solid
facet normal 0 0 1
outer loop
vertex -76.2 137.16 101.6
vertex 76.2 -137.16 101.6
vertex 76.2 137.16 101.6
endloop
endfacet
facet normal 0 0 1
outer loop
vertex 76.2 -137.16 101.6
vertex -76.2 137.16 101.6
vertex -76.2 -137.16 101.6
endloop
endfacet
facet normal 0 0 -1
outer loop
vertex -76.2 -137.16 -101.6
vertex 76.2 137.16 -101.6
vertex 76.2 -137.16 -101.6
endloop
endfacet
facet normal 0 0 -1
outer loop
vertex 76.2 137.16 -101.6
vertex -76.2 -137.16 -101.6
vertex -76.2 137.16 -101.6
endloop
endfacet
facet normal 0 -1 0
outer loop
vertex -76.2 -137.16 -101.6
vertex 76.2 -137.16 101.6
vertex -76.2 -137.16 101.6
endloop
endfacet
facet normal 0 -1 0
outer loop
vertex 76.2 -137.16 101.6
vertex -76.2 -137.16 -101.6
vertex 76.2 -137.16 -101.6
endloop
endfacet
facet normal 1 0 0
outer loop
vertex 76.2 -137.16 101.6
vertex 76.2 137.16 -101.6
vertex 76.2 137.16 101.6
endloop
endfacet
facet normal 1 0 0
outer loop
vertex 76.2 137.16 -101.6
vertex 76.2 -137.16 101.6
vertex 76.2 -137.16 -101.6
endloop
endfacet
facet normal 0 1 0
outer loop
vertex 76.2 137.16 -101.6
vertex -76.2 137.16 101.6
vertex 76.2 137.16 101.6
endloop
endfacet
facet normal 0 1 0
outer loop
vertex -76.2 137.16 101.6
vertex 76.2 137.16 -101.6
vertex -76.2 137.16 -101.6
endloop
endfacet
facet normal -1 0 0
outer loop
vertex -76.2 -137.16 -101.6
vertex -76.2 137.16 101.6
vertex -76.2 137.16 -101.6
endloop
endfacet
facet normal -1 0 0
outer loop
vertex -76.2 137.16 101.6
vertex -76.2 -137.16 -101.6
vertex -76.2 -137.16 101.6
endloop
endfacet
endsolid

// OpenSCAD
// file: src/utils/math.scad
// =============================================================================
// Mathematical Utility Functions
// =============================================================================

// Constants
PI = 3.14159265359;
EPSILON = 0.0001;

// =============================================================================
// TRIGONOMETRIC HELPERS
// =============================================================================

// Convert degrees to radians
function deg_to_rad(degrees) = degrees * PI / 180;

// Convert radians to degrees  
function rad_to_deg(radians) = radians * 180 / PI;

// Normalize angle to 0-360 degrees
function normalize_angle(angle) = 
    angle < 0 ? normalize_angle(angle + 360) :
    angle >= 360 ? normalize_angle(angle - 360) :
    angle;

// =============================================================================
// VECTOR OPERATIONS
// =============================================================================

// Vector magnitude/length
function vector_length(v) = sqrt(v[0]*v[0] + v[1]*v[1] + v[2]*v[2]);

// 2D vector magnitude
function vector_length_2d(v) = sqrt(v[0]*v[0] + v[1]*v[1]);

// Normalize vector to unit length
function normalize_vector(v) = 
    let(len = vector_length(v))
    len > EPSILON ? v / len : [0, 0, 0];

// 2D vector normalization
function normalize_vector_2d(v) = 
    let(len = vector_length_2d(v))
    len > EPSILON ? v / len : [0, 0];

// Dot product
function dot_product(v1, v2) = v1[0]*v2[0] + v1[1]*v2[1] + v1[2]*v2[2];

// 2D dot product
function dot_product_2d(v1, v2) = v1[0]*v2[0] + v1[1]*v2[1];

// Cross product (3D)
function cross_product(v1, v2) = [
    v1[1]*v2[2] - v1[2]*v2[1],
    v1[2]*v2[0] - v1[0]*v2[2], 
    v1[0]*v2[1] - v1[1]*v2[0]
];

// 2D cross product (returns scalar)
function cross_product_2d(v1, v2) = v1[0]*v2[1] - v1[1]*v2[0];

// Distance between two points
function distance(p1, p2) = vector_length(p2 - p1);

// 2D distance between two points
function distance_2d(p1, p2) = vector_length_2d(p2 - p1);

// =============================================================================
// INTERPOLATION FUNCTIONS
// =============================================================================

// Linear interpolation between two values
function lerp(a, b, t) = a + t * (b - a);

// Linear interpolation between two points
function lerp_point(p1, p2, t) = [
    lerp(p1[0], p2[0], t),
    lerp(p1[1], p2[1], t),
    len(p1) > 2 ? lerp(p1[2], p2[2], t) : 0
];

// Smoothstep interpolation (smooth start/end)
function smoothstep(t) = t * t * (3 - 2 * t);

// Smootherstep interpolation (smoother start/end)
function smootherstep(t) = t * t * t * (t * (t * 6 - 15) + 10);

// Clamp value between min and max
function clamp(value, min_val, max_val) = 
    min(max(value, min_val), max_val);

// Map value from one range to another
function map_range(value, from_min, from_max, to_min, to_max) =
    lerp(to_min, to_max, (value - from_min) / (from_max - from_min));

// =============================================================================
// UTILITY FUNCTIONS
// =============================================================================

// Sign function (-1, 0, or 1)
function sign(x) = x > 0 ? 1 : x < 0 ? -1 : 0;

// Check if value is approximately equal (within epsilon)
function approx_equal(a, b, epsilon = EPSILON) = abs(a - b) < epsilon;

// Round to nearest increment
function round_to_increment(value, increment) = 
    round(value / increment) * increment;

// Modulo that works with negative numbers
function mod(a, n) = a - n * floor(a / n);

// =============================================================================
// RANGE AND SEQUENCE FUNCTIONS
// =============================================================================

// Generate range of numbers
function range(start, end, step = 1) = 
    step > 0 && start <= end ? [for (i = [start : step : end]) i] :
    step < 0 && start >= end ? [for (i = [start : step : end]) i] :
    [];

// Generate linearly spaced numbers
function linspace(start, end, num) = 
    num <= 1 ? [start] :
    [for (i = [0 : num-1]) lerp(start, end, i / (num-1))];

// =============================================================================
// BOOLEAN AND COMPARISON HELPERS
// =============================================================================

// Check if point is inside 2D bounding box
function point_in_bbox_2d(point, bbox_min, bbox_max) =
    point[0] >= bbox_min[0] && point[0] <= bbox_max[0] &&
    point[1] >= bbox_min[1] && point[1] <= bbox_max[1];

// Check if point is inside 3D bounding box
function point_in_bbox_3d(point, bbox_min, bbox_max) =
    point[0] >= bbox_min[0] && point[0] <= bbox_max[0] &&
    point[1] >= bbox_min[1] && point[1] <= bbox_max[1] &&
    point[2] >= bbox_min[2] && point[2] <= bbox_max[2];

// =============================================================================
// EXAMPLES AND TESTS
// =============================================================================

// Uncomment to test functions
// echo("Vector length [3,4,5]:", vector_length([3, 4, 5])); // Should be ~7.07
// echo("Normalize [3,4,0]:", normalize_vector([3, 4, 0])); // Should be [0.6, 0.8, 0]
// echo("Lerp 0 to 10 at 0.5:", lerp(0, 10, 0.5)); // Should be 5
// echo("Range 0 to 10 step 2:", range(0, 10, 2)); // Should be [0,2,4,6,8,10]
// file: src/config/tolerances.scad
// =============================================================================
// Teardrop Camper Tolerances & Manufacturing Settings
// =============================================================================

// =============================================================================
// MANUFACTURING CLEARANCES
// =============================================================================

// Basic clearance values
clearance_tight = 0.25;      // 0.01" - Very tight fit for precision parts
clearance_normal = 0.5;      // 0.02" - Standard clearance for most parts
clearance_loose = 1.0;       // 0.04" - Loose fit for moving parts
clearance_slide = 1.5;       // 0.06" - Sliding parts clearance

// Specific component clearances
door_perimeter_gap = 3.0;     // 1/8" - Door perimeter gap 
window_perimeter_gap = 3.0;   // 1/8" - Window perimeter gap
panel_edge_gap = 1.0;         // 0.04" - Gap between adjacent panels
floor_wall_gap = 0.5;         // 0.02" - Gap between floor and wall panels

// Hardware installation clearances
bolt_hole_clearance = 1.0;    // 0.04" - Standard bolt hole clearance
screw_pilot_reduction = 0.5;  // 0.02" - Pilot hole reduction from screw diameter
hinge_placement_tolerance = 1.0; // 0.04" - Hinge placement tolerance

// Thermal expansion allowances
aluminum_expansion_gap = 2.0;   // Gap to allow for aluminum thermal expansion
wood_expansion_gap = 3.0;       // Gap to allow for wood moisture expansion

// =============================================================================
// FIT CLASSES
// =============================================================================

// ISO fit classes for mechanical components (mm)
// Naming: fit_[part]_[fit_type]

// Sliding fits
fit_slide_loose = 0.75;      // Loose sliding fit
fit_slide_normal = 0.5;      // Normal sliding fit
fit_slide_precise = 0.3;     // Precision sliding fit

// Press fits
fit_press_light = 0.1;       // Light press fit
fit_press_medium = 0.2;      // Medium press fit
fit_press_heavy = 0.3;       // Heavy press fit

// Clearance fits
fit_clear_close = 0.2;       // Close clearance fit
fit_clear_normal = 0.5;      // Normal clearance fit
fit_clear_loose = 1.0;       // Loose clearance fit

// =============================================================================
// POSITION TOLERANCES
// =============================================================================

// Positional tolerances for construction
position_precise = 0.5;      // 0.02" - Precise positioning tolerance
position_standard = 1.0;     // 0.04" - Standard positioning tolerance
position_rough = 2.5;        // 0.10" - Rough positioning tolerance

// Alignment tolerances
alignment_critical = 0.25;   // Critical alignment (hinges, latches)
alignment_standard = 1.0;    // Standard alignment (most components)
alignment_rough = 2.5;       // Rough alignment (non-critical components)

// =============================================================================
// THREAD SPECIFICATIONS
// =============================================================================

// Common thread specifications
thread_m3_tap_drill = 2.5;   // M3 tap drill diameter
thread_m4_tap_drill = 3.3;   // M4 tap drill diameter
thread_m5_tap_drill = 4.2;   // M5 tap drill diameter
thread_m6_tap_drill = 5.0;   // M6 tap drill diameter
thread_m8_tap_drill = 6.8;   // M8 tap drill diameter

// Thread engagement lengths (rule of thumb: 1-2× diameter)
thread_engagement_minimum = 0.8;  // Minimum thread engagement factor
thread_engagement_standard = 1.5; // Standard thread engagement factor
thread_engagement_maximum = 2.0;  // Maximum thread engagement factor

// =============================================================================
// TOLERANCE FUNCTIONS
// =============================================================================

// Function to apply specified clearance to dimension
function apply_clearance(dimension, clearance_type = "normal") =
    clearance_type == "tight" ? dimension + clearance_tight :
    clearance_type == "normal" ? dimension + clearance_normal :
    clearance_type == "loose" ? dimension + clearance_loose :
    clearance_type == "slide" ? dimension + clearance_slide :
    dimension + clearance_normal;  // Default to normal

// Function to apply fit tolerance to a shaft/hole dimension
function apply_fit(base_dimension, part_type, fit_type) =
    // For holes, add clearance
    part_type == "hole" ? (
        fit_type == "slide_loose" ? base_dimension + fit_slide_loose :
        fit_type == "slide_normal" ? base_dimension + fit_slide_normal :
        fit_type == "slide_precise" ? base_dimension + fit_slide_precise :
        fit_type == "clear_close" ? base_dimension + fit_clear_close :
        fit_type == "clear_normal" ? base_dimension + fit_clear_normal :
        fit_type == "clear_loose" ? base_dimension + fit_clear_loose :
        fit_type == "press_light" ? base_dimension - fit_press_light :
        fit_type == "press_medium" ? base_dimension - fit_press_medium :
        fit_type == "press_heavy" ? base_dimension - fit_press_heavy :
        base_dimension + fit_clear_normal  // Default to normal clearance
    ) :
    // For shafts, subtract clearance
    part_type == "shaft" ? (
        fit_type == "slide_loose" ? base_dimension - fit_slide_loose :
        fit_type == "slide_normal" ? base_dimension - fit_slide_normal :
        fit_type == "slide_precise" ? base_dimension - fit_slide_precise :
        fit_type == "clear_close" ? base_dimension - fit_clear_close :
        fit_type == "clear_normal" ? base_dimension - fit_clear_normal :
        fit_type == "clear_loose" ? base_dimension - fit_clear_loose :
        fit_type == "press_light" ? base_dimension + fit_press_light :
        fit_type == "press_medium" ? base_dimension + fit_press_medium :
        fit_type == "press_heavy" ? base_dimension + fit_press_heavy :
        base_dimension - fit_clear_normal  // Default to normal clearance
    ) :
    // Default return base dimension if part_type is unspecified
    base_dimension;

// Function to calculate correct pilot hole size for a screw
function pilot_hole_size(screw_diameter, material) =
    material == "softwood" ? screw_diameter * 0.7 :
    material == "hardwood" ? screw_diameter * 0.8 :
    material == "plywood" ? screw_diameter * 0.75 :
    material == "metal" ? screw_diameter * 0.9 :
    material == "plastic" ? screw_diameter * 0.85 :
    screw_diameter * 0.75;  // Default to plywood

// Function to calculate correct thread engagement depth
function thread_engagement(screw_diameter, material) =
    material == "aluminum" ? screw_diameter * thread_engagement_standard :
    material == "steel" ? screw_diameter * thread_engagement_minimum :
    material == "plastic" ? screw_diameter * thread_engagement_maximum :
    material == "wood" ? screw_diameter * 2.0 :
    screw_diameter * thread_engagement_standard;  // Default

// =============================================================================
// HELPER MODULES
// =============================================================================

// Module to create a clearance hole for a bolt
module clearance_hole(diameter, depth = 20, clearance_type = "normal") {
    adjusted_diameter = apply_clearance(diameter, clearance_type);
    cylinder(h = depth, d = adjusted_diameter);
}

// Module to create a countersunk hole
module countersunk_hole(diameter, head_diameter, depth = 20, head_depth = 3, clearance_type = "normal") {
    adjusted_diameter = apply_clearance(diameter, clearance_type);
    adjusted_head = apply_clearance(head_diameter, clearance_type);
    
    union() {
        cylinder(h = depth, d = adjusted_diameter);
        cylinder(h = head_depth, d1 = adjusted_diameter, d2 = adjusted_head);
    }
}

// Module to add a tolerance gap between parts
module tolerance_gap(width, length, depth, gap_size = clearance_normal) {
    cube([width + gap_size*2, length + gap_size*2, depth]);
}
// file: src/config/materials.scad
// =============================================================================
// Teardrop Camper Materials & Visual Properties
// =============================================================================

// =============================================================================
// COLOR DEFINITIONS
// =============================================================================

// Basic material colors
color_aluminum = [0.9, 0.9, 0.92, 1.0];        // Aluminum exterior
color_aluminum_dark = [0.8, 0.8, 0.83, 1.0];   // Darker aluminum accents
color_steel = [0.7, 0.7, 0.7, 1.0];            // Steel frame components
color_galvanized = [0.8, 0.82, 0.85, 1.0];     // Galvanized steel components
color_wood_deck = [0.8, 0.7, 0.5, 1.0];        // Wood trailer deck
color_rubber = [0.2, 0.2, 0.2, 1.0];           // Rubber components (tires, seals)
color_plastic_black = [0.2, 0.2, 0.22, 1.0];   // Black plastic components
color_plastic_white = [0.98, 0.98, 0.98, 1.0]; // White plastic components

// Interior colors
color_frp_white = [0.98, 0.98, 0.97, 1.0];     // Fiberglass reinforced panels
color_wood_ceiling = [0.82, 0.7, 0.55, 1.0];   // Wood-look ceiling panels
color_mattress = [0.7, 0.75, 0.8, 1.0];        // Mattress color
color_upholstery = [0.6, 0.65, 0.7, 1.0];      // Upholstery fabric

// Window & transparent materials
color_glass = [0.9, 0.95, 1.0, 0.5];           // Glass with transparency
color_glass_tinted = [0.7, 0.7, 0.8, 0.5];     // Tinted glass
color_plexiglass = [0.9, 0.95, 1.0, 0.7];      // Plexiglass/acrylic

// Insulation & invisible materials
color_insulation = [0.9, 0.85, 0.6, 0.7];      // Insulation material
color_frame = [0.7, 0.8, 0.8, 0.8];            // Framing (semi-transparent for visualization)

// Hardware colors
color_hinge_steel = [0.8, 0.8, 0.8, 1.0];      // Steel hinges
color_latch_chrome = [0.9, 0.9, 0.9, 1.0];     // Chrome latches
color_handle_aluminum = [0.95, 0.95, 0.95, 1.0]; // Aluminum handles
color_wire_black = [0.1, 0.1, 0.1, 1.0];       // Black electrical wiring
color_wire_red = [0.8, 0.2, 0.2, 1.0];         // Red electrical wiring

// =============================================================================
// MATERIAL PROPERTIES
// =============================================================================

// Structural materials
aluminum_thickness = 1.27;         // 0.050" aluminum sheet
frp_thickness = 2.38;              // 3/32" FRP panels
plywood_thickness = 12.7;          // 1/2" plywood
plywood_floor_thickness = 19.05;   // 3/4" floor plywood
insulation_thickness = 38.1;       // 1.5" foam insulation
frame_aluminum_size = 25.4;        // 1" aluminum angle/tube
frame_steel_size = 38.1;           // 1.5" steel tube/angle

// Hardware dimensions
hinge_length = 76.2;               // 3" hinge
hinge_width = 50.8;                // 2" hinge width
hinge_thickness = 3.175;           // 1/8" hinge material
screw_size_small = 4.0;            // #8 screws
screw_size_large = 6.35;           // 1/4" bolts

// =============================================================================
// RENDERING QUALITY PARAMETERS
// =============================================================================

// Define different quality levels for rendering
function get_fn(quality) =
    quality == "preview" ? 20 :     // Fast preview quality
    quality == "medium" ? 50 :      // Medium quality for development
    quality == "high" ? 100 :       // High quality for final renders
    quality == "export" ? 150 :     // Maximum quality for exports
    20;                             // Default to preview quality

// Function to set material transparency for different visualization modes
function get_transparency(material, mode) =
    mode == "normal" ? 1.0 :                          // Normal rendering
    mode == "cutaway" && (material == "frame" ||      
                          material == "insulation") ? 0.4 :  // Make structure visible
    mode == "xray" ? 0.3 :                            // X-ray mode
    mode == "ghosted" ? 0.6 :                         // Ghosted mode
    1.0;                                              // Default to normal

// =============================================================================
// VISUALIZATION MODES
// =============================================================================

// Render modes for visualization
render_mode = "normal";       // "normal", "cutaway", "xray", "ghosted"
quality = "preview";          // "preview", "medium", "high", "export"

// Set $fn based on quality setting
// $fn is set in main.scad to prevent circular reference

// =============================================================================
// MATERIAL APPLICATION FUNCTIONS
// =============================================================================

// Apply aluminum exterior finish
module apply_aluminum_exterior() {
    color(color_aluminum) children();
}

// Apply interior wall finish
module apply_interior_wall() {
    color(color_frp_white) children();
}

// Apply interior ceiling finish
module apply_interior_ceiling() {
    color(color_wood_ceiling) children();
}

// Apply insulation material
module apply_insulation() {
    color(color_insulation) children();
}

// Apply glass material (for windows)
module apply_window_material(tinted = false) {
    if (tinted)
        color(color_glass_tinted) children();
    else
        color(color_glass) children();
}

// Apply steel frame material
module apply_frame_material() {
    color(color_steel) children();
}

// Apply wood deck material
module apply_wood_deck() {
    color(color_wood_deck) children();
}
// file: src/config/dimensions.scad
// =============================================================================
// Teardrop Camper Dimensions & Parameters
// =============================================================================

// =============================================================================
// OVERALL DIMENSIONS
// =============================================================================

// Basic camper dimensions
trailer_length = 2438.4;           // 96" (8') - Harbor Freight trailer bed length
trailer_width = 1219.2;            // 48" (4') - Harbor Freight trailer bed width
body_length = 2743.2;              // 108" (9') - Total body length (includes 12" overhang)
body_width = 1524.0;               // 60" (5') - Total body width (extends 6" beyond each side)
overall_height = 2032.0;           // 80" - Height from ground to roof (to be adjusted)

// Trailer and ground parameters
ground_clearance = 609.6;          // 24" - Standard trailer height from ground
wheel_well_height = 254.0;         // 10" - Height of wheel wells above trailer deck
wheel_well_width = 457.2;          // 18" - Width of wheel wells
wheel_well_length = 762.0;         // 30" - Length of wheel wells

// Wall and construction thicknesses
wall_thickness = 63.5;             // 2.5" - Outer wall thickness with insulation
floor_thickness = 38.1;            // 1.5" - Floor insulation thickness
roof_thickness = 63.5;             // 2.5" - Roof thickness with insulation
platform_height = 101.6;           // 4" - Height of raised bed platform

// =============================================================================
// INTERIOR DIMENSIONS
// =============================================================================

// Derived interior dimensions
interior_length = body_length - (2 * wall_thickness);  // Interior cabin length
interior_width = body_width - (2 * wall_thickness);    // Interior cabin width
interior_height = 1168.4;          // 46" - Interior height from bed surface to ceiling

// Sleeping area dimensions
sleeping_width = 1524.0;           // 60" - Queen mattress width
sleeping_length = 2032.0;          // 80" - Queen mattress length

// Storage dimensions
headboard_depth = 304.8;           // 12" - Headboard storage depth
foot_cabinet_length = 304.8;       // 12" - Foot cabinet storage length

// =============================================================================
// DOOR & WINDOW DIMENSIONS
// =============================================================================

// Door dimensions
door_width = 762.0;                // 30" - Door width
door_height = 914.4;               // 36" - Door height
door_thickness = 44.45;            // 1.75" - Door panel thickness

// Window dimensions
door_window_width = 304.8;         // 12" - Door window width
door_window_height = 406.4;        // 16" - Door window height
stargazing_window_width = 609.6;   // 24" - Front window width
stargazing_window_height = 762.0;  // 30" - Front window height
glass_thickness = 4.0;             // 0.16" - Glass thickness

// Ventilation dimensions
maxfan_width = 355.6;              // 14" - MaxxFan standard size
maxfan_length = 355.6;             // 14" - MaxxFan standard size
maxfan_height = 101.6;             // 4" - MaxxFan height above roof

// =============================================================================
// STORAGE COMPARTMENT DIMENSIONS
// =============================================================================

// Headboard storage breakdown
headboard_left_width = 457.2;      // 18" - Left personal storage width
headboard_center_width = 609.6;    // 24" - EcoFlow compartment width
headboard_right_width = 457.2;     // 18" - Right personal storage width
headboard_height = 508.0;          // 20" - Storage height

// Foot cabinet breakdown
foot_left_width = 457.2;           // 18" - Left cabinet width
foot_center_width = 609.6;         // 24" - Center open shelf width
foot_right_width = 457.2;          // 18" - Right cabinet width
foot_cabinet_height = 304.8;       // 12" - Cabinet height

// Electrical dimensions
ecoflow_length = 289.56;           // 11.4" - EcoFlow River III length
ecoflow_width = 185.42;            // 7.3" - EcoFlow River III width
ecoflow_height = 210.82;           // 8.3" - EcoFlow River III height
ecoflow_clearance = 25.4;          // 1" - Clearance around EcoFlow unit

// =============================================================================
// DESIGN CONSTRAINTS & DISPLAY SETTINGS
// =============================================================================

// Precision & quality settings
$fn = 50;                          // Default curve segment count

// Design constraints
max_total_length = 3657.6;         // 144" (12') - Maximum length for easy towing
max_total_width = 2590.8;          // 102" (8.5') - Maximum width for legal towing
max_total_height = 2743.2;         // 108" (9') - Maximum height for clearance
max_weight = 453.59;               // 1000 lbs - Target weight

// =============================================================================
// CALCULATED VALUES
// =============================================================================

// Interior usable space calculations
usable_length = interior_length - headboard_depth - foot_cabinet_length;
usable_width = interior_width;
usable_height = interior_height;

// Total estimated dimensions 
total_length = body_length + 304.8;  // Body + tongue extension
total_width = body_width;
total_height = ground_clearance + floor_thickness + platform_height + interior_height + roof_thickness;

// Validity checks
length_valid = total_length <= max_total_length;
width_valid = total_width <= max_total_width;
height_valid = total_height <= max_total_height;

// Debug checks
echo("Interior dimensions: ", interior_length, "mm x ", interior_width, "mm x ", interior_height, "mm");
echo("Total dimensions: ", total_length, "mm x ", total_width, "mm x ", total_height, "mm");
echo("Dimensional validity: Length=", length_valid, ", Width=", width_valid, ", Height=", height_valid);
// main file
// =============================================================================
// Maple Canyon Teardrop Camper
// =============================================================================

// Import configuration files
include <src/config/dimensions.scad>
include <src/config/materials.scad>
include <src/config/tolerances.scad>

// Import utility libraries
use <src/utils/math.scad>
use <src/utils/geometry.scad>
use <src/utils/shapes.scad>
use <src/utils/extrusions.scad>

// Set global parameters
// If quality not defined, use default
$fn = is_undef(quality) ? 50 : get_fn(quality);  // Set resolution based on quality setting

// Display simple preview
// This will be replaced by actual model components
color(color_aluminum)
  cube([body_width/10, body_length/10, overall_height/10], center=true);
echo("Teardrop camper config loaded successfully!");
echo("Use the component files to build the full model.");
